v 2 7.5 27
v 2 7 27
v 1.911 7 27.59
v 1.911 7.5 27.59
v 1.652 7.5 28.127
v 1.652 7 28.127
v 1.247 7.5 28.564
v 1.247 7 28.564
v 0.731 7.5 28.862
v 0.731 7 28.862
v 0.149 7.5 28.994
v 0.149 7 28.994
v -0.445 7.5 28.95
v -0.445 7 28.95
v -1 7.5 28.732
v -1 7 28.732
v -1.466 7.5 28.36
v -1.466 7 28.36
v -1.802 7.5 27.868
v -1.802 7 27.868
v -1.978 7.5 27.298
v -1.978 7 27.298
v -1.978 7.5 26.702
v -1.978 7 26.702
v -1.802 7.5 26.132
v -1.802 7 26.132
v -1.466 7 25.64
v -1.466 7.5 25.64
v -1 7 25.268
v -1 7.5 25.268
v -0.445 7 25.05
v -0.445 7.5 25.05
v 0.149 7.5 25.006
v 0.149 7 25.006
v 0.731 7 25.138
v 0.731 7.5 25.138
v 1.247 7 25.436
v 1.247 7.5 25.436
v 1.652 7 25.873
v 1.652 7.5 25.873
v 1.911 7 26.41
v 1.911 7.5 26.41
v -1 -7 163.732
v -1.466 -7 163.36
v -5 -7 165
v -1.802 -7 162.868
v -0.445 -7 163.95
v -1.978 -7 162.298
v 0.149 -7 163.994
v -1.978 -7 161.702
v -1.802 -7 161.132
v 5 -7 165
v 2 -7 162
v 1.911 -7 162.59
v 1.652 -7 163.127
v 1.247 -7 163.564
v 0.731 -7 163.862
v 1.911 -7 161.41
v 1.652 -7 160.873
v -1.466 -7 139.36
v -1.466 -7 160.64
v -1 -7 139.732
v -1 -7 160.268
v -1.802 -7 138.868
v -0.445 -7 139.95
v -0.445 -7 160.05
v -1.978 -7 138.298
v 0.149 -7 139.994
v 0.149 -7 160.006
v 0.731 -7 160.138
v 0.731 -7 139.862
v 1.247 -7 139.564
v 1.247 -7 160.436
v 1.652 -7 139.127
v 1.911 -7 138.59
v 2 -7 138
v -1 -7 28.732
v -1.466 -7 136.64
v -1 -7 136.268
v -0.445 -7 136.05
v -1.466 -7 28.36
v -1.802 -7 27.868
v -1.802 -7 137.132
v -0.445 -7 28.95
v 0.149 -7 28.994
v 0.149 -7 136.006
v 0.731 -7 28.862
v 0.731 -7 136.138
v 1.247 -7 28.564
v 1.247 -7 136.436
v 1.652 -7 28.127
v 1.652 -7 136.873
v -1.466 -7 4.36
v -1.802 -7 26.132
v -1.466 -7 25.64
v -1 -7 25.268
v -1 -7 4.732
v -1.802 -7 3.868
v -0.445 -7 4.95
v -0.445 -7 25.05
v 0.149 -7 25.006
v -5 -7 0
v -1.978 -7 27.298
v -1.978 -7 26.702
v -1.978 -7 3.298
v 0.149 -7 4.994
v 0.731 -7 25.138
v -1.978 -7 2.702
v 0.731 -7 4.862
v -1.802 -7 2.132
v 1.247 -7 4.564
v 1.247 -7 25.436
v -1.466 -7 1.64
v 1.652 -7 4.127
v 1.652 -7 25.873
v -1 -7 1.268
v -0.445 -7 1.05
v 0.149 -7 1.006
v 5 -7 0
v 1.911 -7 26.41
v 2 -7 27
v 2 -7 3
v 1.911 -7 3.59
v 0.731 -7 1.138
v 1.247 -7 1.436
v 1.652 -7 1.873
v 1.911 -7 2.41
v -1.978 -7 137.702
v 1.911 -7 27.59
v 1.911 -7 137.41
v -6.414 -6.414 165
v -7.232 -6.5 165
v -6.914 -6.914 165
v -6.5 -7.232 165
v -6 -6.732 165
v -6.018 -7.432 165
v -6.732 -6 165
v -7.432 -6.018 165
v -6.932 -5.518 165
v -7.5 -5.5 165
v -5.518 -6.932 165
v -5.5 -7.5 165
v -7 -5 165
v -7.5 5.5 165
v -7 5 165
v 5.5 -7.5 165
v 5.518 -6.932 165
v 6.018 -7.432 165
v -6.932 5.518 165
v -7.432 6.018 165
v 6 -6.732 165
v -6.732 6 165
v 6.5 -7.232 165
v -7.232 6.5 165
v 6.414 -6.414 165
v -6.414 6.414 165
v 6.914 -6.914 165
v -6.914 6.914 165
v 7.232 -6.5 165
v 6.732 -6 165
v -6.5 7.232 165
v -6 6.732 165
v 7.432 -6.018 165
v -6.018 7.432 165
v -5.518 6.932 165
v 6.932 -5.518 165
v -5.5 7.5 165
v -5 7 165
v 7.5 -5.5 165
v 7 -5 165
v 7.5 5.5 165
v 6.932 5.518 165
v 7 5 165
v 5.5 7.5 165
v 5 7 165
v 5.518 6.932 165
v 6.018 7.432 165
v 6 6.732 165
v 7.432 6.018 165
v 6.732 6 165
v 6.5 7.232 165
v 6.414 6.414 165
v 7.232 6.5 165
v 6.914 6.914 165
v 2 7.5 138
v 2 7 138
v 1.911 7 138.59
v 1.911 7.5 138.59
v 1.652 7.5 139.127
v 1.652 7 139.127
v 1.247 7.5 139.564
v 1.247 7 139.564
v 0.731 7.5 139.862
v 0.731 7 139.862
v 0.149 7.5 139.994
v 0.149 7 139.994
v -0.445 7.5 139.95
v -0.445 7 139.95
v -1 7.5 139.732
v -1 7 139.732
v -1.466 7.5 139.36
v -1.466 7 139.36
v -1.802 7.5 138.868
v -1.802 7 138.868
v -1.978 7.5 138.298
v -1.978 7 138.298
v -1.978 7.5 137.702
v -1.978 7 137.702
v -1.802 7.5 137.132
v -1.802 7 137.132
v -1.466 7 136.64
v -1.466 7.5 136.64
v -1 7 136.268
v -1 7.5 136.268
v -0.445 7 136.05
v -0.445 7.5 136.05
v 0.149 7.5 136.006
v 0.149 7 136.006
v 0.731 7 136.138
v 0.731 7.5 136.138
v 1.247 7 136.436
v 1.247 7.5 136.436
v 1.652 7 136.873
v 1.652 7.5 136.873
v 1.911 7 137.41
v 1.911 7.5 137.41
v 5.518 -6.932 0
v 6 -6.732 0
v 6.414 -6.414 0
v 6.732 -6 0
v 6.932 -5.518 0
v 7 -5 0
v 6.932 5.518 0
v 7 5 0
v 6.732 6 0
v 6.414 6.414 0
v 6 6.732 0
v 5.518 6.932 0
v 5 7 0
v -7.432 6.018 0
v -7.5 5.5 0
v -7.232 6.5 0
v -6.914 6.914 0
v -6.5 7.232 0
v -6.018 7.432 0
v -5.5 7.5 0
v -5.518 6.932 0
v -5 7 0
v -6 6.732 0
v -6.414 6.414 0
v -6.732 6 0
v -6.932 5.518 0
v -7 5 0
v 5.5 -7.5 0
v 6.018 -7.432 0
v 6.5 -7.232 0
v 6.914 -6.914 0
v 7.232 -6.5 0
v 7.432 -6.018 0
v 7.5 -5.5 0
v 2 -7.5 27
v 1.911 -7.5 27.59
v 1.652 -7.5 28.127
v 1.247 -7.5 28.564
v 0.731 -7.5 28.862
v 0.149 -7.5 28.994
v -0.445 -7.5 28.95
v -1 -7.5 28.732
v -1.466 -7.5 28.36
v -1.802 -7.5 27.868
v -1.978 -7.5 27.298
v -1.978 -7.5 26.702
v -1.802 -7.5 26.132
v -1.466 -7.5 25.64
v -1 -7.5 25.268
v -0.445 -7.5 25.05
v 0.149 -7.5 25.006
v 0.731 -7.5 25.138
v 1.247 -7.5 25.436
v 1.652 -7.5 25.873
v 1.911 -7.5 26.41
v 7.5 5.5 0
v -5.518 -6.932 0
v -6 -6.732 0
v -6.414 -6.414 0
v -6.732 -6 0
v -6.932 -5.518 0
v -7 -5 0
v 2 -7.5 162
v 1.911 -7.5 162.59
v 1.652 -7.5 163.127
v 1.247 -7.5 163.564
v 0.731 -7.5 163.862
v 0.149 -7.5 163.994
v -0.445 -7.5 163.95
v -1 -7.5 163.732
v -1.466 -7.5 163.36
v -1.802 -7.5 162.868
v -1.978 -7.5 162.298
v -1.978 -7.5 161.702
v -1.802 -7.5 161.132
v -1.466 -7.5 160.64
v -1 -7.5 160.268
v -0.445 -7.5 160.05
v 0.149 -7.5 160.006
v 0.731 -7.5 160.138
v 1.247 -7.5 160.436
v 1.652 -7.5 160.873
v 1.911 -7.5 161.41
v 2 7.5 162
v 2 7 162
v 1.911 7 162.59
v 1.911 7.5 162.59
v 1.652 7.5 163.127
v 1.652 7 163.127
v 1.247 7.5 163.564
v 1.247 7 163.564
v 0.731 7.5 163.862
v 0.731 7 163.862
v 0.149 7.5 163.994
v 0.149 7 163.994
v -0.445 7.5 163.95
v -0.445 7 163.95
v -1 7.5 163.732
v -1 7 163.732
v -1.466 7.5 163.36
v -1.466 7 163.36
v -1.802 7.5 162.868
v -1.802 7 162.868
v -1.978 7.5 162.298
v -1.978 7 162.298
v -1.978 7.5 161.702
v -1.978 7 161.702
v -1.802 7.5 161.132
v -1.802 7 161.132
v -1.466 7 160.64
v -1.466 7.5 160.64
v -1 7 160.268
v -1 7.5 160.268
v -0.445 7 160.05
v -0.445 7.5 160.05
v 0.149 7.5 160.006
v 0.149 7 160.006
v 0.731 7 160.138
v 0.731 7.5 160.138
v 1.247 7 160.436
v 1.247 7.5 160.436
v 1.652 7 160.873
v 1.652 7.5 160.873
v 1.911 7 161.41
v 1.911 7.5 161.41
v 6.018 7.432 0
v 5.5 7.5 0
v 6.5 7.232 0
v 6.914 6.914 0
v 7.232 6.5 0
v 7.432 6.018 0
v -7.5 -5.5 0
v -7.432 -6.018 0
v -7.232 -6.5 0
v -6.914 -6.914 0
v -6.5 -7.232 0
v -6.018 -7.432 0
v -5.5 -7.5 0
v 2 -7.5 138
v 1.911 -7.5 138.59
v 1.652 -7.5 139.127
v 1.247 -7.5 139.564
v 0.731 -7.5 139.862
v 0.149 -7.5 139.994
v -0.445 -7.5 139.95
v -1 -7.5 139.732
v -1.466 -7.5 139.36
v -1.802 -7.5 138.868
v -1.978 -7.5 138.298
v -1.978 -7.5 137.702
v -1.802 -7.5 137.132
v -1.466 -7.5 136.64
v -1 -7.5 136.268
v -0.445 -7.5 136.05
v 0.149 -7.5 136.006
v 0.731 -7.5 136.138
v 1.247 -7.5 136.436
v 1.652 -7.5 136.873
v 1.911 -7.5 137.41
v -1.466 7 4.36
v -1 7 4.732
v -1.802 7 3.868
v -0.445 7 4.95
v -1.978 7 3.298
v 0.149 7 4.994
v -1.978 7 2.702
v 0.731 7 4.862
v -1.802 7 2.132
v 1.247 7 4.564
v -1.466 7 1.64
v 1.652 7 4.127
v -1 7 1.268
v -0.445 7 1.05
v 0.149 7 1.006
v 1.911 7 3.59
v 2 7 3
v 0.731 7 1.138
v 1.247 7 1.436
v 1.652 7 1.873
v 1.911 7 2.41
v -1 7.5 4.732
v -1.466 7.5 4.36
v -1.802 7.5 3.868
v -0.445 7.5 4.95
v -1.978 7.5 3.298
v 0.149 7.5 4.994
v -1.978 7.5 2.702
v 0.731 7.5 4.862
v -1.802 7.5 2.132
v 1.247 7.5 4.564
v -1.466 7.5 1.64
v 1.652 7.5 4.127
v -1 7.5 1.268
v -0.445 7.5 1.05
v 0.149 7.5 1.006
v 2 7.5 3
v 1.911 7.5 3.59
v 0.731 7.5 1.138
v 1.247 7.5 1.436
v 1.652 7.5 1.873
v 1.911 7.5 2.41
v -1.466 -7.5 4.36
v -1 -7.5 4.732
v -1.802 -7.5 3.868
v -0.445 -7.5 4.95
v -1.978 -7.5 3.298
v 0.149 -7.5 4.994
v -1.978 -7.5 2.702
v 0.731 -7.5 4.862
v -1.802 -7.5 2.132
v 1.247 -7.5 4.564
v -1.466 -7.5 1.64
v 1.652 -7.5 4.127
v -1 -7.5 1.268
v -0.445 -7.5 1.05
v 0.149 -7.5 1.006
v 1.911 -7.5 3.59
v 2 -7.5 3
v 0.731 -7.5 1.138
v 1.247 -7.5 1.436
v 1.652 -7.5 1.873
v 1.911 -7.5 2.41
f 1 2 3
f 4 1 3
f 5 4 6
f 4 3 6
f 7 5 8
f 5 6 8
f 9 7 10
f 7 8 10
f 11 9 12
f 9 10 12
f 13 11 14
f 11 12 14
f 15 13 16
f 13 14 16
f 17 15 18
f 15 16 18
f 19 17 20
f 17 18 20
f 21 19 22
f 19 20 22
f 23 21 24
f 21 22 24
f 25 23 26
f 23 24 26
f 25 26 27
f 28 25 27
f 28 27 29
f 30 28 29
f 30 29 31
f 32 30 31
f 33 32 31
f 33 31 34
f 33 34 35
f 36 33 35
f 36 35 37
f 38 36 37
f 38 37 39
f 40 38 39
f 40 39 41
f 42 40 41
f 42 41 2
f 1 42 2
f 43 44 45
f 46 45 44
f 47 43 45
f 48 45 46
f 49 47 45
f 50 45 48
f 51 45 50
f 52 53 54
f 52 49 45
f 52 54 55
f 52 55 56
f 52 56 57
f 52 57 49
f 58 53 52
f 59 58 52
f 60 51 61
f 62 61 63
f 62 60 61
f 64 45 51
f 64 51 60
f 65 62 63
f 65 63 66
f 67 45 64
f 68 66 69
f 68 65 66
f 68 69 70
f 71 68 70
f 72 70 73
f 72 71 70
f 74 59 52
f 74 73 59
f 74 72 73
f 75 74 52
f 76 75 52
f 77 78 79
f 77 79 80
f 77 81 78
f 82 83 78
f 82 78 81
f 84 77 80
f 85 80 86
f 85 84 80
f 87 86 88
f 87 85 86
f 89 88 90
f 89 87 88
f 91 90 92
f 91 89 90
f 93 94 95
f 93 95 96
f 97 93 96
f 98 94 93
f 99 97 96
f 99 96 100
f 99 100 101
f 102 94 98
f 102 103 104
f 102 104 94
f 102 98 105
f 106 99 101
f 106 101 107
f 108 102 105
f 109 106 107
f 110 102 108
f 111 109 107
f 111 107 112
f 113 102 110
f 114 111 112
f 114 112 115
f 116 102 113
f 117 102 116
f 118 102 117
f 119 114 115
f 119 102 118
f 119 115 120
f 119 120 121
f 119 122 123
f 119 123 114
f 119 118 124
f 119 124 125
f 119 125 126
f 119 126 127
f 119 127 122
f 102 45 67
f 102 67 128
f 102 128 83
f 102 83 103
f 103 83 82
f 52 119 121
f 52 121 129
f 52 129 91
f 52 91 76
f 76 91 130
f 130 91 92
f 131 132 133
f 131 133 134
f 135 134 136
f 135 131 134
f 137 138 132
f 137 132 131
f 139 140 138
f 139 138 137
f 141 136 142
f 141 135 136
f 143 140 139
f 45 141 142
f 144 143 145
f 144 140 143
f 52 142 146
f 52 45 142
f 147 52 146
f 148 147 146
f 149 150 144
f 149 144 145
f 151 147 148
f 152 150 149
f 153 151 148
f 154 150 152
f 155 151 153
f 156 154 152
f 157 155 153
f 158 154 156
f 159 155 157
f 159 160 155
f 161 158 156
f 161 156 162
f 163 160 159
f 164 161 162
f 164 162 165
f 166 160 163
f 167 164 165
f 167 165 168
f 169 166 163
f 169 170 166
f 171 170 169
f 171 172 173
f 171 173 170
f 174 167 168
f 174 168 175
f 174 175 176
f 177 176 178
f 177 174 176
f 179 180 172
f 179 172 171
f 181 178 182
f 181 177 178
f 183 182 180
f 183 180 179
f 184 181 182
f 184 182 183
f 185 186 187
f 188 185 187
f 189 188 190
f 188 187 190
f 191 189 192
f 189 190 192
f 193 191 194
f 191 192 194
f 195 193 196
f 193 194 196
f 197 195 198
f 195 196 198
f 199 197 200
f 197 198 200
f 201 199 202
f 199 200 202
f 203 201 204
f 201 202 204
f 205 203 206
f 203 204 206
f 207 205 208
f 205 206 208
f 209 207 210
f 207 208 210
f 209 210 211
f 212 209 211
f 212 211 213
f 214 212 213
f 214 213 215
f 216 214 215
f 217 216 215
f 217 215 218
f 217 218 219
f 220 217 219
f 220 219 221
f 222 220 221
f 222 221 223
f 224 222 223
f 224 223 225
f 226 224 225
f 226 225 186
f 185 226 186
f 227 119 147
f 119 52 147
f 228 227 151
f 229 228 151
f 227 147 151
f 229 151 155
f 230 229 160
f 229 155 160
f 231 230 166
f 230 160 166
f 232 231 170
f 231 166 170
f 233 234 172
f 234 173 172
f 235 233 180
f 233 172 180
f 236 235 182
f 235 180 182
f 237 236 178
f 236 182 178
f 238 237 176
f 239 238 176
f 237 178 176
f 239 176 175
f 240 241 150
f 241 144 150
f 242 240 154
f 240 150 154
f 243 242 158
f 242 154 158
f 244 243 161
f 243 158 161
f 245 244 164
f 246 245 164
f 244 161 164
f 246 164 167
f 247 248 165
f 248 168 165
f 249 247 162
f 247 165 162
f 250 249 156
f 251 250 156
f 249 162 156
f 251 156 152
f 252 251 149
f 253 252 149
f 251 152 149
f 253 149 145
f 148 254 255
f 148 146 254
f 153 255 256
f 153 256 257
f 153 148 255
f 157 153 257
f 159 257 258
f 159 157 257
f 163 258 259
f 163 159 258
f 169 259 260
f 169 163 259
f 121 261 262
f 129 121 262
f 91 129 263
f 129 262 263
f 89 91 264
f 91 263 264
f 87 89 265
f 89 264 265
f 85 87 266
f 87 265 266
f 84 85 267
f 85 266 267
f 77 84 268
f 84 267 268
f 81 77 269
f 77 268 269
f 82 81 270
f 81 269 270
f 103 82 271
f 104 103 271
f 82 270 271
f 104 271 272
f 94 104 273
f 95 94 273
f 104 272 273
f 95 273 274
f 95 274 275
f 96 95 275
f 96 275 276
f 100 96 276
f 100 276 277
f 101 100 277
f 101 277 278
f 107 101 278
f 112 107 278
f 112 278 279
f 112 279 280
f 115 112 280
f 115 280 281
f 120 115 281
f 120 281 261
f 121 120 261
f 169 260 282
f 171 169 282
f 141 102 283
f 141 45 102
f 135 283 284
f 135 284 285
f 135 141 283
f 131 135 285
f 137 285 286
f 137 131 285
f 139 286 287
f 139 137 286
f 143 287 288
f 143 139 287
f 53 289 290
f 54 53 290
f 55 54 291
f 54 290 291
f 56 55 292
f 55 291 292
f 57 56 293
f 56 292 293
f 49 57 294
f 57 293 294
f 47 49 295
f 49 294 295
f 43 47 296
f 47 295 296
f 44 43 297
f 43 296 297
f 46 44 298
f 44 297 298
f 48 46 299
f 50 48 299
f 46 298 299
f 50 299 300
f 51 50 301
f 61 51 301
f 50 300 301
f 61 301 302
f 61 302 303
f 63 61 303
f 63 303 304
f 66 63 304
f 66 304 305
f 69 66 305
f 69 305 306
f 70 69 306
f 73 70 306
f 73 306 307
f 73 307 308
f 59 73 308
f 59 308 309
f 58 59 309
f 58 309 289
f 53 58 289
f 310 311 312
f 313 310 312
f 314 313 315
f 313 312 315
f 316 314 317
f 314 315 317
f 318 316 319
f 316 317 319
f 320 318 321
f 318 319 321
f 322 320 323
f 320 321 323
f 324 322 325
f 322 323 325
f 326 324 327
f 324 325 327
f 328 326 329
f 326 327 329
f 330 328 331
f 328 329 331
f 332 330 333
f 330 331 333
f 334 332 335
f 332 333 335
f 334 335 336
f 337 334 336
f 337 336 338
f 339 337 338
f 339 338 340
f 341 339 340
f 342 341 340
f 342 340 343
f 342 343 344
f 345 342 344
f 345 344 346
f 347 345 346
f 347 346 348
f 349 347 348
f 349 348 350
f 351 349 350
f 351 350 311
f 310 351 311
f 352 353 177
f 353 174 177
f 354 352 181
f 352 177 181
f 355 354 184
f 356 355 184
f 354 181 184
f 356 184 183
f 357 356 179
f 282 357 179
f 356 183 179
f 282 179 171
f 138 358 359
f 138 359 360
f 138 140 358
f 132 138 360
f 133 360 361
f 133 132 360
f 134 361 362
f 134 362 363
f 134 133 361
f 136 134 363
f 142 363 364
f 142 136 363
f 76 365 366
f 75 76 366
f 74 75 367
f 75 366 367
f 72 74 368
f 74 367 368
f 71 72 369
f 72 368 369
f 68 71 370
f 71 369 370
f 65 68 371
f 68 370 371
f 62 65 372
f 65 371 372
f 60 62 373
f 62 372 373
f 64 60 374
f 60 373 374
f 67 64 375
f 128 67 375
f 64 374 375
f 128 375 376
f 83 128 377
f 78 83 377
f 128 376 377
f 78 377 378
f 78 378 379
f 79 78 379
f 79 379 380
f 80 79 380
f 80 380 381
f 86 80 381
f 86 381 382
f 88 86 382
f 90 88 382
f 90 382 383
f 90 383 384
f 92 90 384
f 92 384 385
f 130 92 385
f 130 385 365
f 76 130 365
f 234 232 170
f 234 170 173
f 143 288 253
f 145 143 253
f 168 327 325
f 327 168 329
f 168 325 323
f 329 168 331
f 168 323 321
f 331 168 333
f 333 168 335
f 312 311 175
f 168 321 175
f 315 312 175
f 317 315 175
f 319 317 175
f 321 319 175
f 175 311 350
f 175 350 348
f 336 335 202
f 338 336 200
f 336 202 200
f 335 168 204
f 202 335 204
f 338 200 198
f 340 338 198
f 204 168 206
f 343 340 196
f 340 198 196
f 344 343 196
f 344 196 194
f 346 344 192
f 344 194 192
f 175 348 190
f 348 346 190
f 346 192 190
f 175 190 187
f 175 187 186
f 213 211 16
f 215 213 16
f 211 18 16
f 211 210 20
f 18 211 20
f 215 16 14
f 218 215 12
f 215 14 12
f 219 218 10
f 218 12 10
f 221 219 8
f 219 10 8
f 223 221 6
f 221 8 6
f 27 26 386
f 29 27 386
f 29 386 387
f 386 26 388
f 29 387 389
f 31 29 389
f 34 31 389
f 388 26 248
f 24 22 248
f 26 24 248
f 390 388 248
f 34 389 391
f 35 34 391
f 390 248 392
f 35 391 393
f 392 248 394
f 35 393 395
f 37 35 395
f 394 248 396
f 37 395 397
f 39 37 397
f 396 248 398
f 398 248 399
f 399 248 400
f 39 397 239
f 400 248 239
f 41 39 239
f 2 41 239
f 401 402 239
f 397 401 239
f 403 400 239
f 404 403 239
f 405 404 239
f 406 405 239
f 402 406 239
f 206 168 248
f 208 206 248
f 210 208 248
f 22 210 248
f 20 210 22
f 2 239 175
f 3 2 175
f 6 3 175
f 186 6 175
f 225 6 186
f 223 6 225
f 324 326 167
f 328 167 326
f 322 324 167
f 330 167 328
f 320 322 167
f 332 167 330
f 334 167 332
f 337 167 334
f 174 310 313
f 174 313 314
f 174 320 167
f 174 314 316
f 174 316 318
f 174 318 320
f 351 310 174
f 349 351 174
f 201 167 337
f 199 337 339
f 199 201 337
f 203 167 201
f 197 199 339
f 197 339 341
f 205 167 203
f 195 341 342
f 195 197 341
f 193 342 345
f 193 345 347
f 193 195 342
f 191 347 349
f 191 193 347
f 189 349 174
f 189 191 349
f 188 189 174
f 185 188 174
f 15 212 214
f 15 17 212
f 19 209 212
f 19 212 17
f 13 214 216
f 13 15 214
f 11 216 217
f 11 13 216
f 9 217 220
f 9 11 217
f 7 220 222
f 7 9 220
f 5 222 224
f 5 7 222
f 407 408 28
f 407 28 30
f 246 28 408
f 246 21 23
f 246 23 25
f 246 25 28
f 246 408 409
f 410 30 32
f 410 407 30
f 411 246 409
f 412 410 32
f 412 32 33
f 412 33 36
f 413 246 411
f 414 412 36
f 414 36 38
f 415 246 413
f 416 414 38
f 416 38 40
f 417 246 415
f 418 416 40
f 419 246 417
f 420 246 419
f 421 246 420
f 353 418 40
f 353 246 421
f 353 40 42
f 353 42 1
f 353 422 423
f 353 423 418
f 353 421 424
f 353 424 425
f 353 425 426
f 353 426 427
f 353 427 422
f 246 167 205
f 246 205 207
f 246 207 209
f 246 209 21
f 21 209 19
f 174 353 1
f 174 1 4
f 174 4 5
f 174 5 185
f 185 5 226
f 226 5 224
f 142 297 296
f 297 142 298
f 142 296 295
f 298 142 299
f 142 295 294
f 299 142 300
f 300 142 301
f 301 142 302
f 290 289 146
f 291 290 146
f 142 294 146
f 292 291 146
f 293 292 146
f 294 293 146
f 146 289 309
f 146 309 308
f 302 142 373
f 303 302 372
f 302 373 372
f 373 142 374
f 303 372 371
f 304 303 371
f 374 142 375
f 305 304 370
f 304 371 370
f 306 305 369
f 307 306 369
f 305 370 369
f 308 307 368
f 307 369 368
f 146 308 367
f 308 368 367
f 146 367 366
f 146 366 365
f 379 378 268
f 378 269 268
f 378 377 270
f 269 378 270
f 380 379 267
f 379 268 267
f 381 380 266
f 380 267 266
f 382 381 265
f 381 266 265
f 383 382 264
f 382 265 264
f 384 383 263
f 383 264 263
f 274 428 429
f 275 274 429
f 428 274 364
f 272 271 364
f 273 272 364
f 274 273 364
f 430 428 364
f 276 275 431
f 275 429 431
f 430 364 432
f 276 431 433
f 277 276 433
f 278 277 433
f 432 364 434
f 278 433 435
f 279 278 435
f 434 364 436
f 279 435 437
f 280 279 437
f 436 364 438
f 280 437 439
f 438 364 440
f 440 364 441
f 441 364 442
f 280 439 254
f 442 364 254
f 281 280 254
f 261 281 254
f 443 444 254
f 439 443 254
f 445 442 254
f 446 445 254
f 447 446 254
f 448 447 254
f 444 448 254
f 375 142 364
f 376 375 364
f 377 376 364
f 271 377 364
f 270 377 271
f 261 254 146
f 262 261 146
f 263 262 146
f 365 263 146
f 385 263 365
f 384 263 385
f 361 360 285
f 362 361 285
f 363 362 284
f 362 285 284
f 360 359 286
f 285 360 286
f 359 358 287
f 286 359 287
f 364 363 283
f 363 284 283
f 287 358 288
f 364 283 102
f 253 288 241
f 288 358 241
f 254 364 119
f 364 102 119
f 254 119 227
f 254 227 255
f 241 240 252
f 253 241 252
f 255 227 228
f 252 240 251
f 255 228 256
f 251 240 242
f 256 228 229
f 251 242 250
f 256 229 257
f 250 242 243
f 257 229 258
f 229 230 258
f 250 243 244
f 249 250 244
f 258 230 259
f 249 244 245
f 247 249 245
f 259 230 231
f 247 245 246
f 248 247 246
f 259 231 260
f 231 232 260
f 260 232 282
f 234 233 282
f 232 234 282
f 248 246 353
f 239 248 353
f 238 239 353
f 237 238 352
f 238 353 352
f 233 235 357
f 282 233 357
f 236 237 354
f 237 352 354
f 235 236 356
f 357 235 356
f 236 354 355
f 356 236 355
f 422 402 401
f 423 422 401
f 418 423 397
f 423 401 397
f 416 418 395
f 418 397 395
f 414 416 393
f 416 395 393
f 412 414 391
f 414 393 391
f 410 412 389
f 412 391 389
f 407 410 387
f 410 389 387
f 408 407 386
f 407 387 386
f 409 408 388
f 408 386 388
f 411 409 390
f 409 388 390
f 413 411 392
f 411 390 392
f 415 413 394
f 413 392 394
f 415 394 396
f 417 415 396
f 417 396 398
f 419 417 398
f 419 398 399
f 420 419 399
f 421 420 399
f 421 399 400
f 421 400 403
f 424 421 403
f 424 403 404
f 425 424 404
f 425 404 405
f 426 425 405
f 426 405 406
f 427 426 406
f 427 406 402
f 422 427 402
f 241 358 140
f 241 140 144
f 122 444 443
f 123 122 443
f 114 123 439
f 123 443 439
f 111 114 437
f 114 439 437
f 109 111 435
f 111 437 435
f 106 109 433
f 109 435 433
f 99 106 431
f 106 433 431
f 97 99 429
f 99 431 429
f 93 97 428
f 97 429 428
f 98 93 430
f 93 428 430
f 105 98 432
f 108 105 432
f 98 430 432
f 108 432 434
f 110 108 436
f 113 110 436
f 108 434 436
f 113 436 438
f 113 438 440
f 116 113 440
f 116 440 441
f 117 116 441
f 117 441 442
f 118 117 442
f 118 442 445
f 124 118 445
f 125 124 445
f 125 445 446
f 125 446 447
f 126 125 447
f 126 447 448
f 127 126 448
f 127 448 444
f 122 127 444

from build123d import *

# Parameters (mm, degrees)
SKETCH1_W           = 15
SKETCH1_H           = 15
SKETCH1_W_2         = 14
SKETCH1_H_2         = 14
BOSS_EXTRUDE1_DEPTH = 165
FILLET1_R           = 2
SKETCH2_R           = 2
CUT_EXTRUDE2_DEPTH  = 28


with BuildPart() as part:
    # Sketch1 → Boss-Extrude1 (new body)
    with BuildSketch(Plane.XY):
        Rectangle(SKETCH1_W, SKETCH1_H)
        Rectangle(SKETCH1_W_2, SKETCH1_H_2, mode=Mode.SUBTRACT)
    extrude(amount=BOSS_EXTRUDE1_DEPTH)

    # Fillet1
    fillet1_edges = [part.edges().sort_by_distance(p)[0] for p in [
        (-7, 7, 82.5),
        (-7, -7, 82.5),
        (7, -7, 82.5),
        (7, 7, 82.5),
        (-7.5, 7.5, 82.5),
        (7.5, 7.5, 82.5),
        (7.5, -7.5, 82.5),
        (-7.5, -7.5, 82.5),
    ]]
    fillet(fillet1_edges, radius=FILLET1_R)

    # Sketch2 → Cut-Extrude2 (cut)
    with BuildSketch(Plane.XZ.offset(7.5)):
        with Locations((0, 162)):
            Circle(SKETCH2_R)
        with Locations((0, 138)):
            Circle(SKETCH2_R)
        with Locations((0, 27)):
            Circle(SKETCH2_R)
        with Locations((0, 3)):
            Circle(SKETCH2_R)
    extrude(amount=-CUT_EXTRUDE2_DEPTH, mode=Mode.SUBTRACT)


solid = part.part
